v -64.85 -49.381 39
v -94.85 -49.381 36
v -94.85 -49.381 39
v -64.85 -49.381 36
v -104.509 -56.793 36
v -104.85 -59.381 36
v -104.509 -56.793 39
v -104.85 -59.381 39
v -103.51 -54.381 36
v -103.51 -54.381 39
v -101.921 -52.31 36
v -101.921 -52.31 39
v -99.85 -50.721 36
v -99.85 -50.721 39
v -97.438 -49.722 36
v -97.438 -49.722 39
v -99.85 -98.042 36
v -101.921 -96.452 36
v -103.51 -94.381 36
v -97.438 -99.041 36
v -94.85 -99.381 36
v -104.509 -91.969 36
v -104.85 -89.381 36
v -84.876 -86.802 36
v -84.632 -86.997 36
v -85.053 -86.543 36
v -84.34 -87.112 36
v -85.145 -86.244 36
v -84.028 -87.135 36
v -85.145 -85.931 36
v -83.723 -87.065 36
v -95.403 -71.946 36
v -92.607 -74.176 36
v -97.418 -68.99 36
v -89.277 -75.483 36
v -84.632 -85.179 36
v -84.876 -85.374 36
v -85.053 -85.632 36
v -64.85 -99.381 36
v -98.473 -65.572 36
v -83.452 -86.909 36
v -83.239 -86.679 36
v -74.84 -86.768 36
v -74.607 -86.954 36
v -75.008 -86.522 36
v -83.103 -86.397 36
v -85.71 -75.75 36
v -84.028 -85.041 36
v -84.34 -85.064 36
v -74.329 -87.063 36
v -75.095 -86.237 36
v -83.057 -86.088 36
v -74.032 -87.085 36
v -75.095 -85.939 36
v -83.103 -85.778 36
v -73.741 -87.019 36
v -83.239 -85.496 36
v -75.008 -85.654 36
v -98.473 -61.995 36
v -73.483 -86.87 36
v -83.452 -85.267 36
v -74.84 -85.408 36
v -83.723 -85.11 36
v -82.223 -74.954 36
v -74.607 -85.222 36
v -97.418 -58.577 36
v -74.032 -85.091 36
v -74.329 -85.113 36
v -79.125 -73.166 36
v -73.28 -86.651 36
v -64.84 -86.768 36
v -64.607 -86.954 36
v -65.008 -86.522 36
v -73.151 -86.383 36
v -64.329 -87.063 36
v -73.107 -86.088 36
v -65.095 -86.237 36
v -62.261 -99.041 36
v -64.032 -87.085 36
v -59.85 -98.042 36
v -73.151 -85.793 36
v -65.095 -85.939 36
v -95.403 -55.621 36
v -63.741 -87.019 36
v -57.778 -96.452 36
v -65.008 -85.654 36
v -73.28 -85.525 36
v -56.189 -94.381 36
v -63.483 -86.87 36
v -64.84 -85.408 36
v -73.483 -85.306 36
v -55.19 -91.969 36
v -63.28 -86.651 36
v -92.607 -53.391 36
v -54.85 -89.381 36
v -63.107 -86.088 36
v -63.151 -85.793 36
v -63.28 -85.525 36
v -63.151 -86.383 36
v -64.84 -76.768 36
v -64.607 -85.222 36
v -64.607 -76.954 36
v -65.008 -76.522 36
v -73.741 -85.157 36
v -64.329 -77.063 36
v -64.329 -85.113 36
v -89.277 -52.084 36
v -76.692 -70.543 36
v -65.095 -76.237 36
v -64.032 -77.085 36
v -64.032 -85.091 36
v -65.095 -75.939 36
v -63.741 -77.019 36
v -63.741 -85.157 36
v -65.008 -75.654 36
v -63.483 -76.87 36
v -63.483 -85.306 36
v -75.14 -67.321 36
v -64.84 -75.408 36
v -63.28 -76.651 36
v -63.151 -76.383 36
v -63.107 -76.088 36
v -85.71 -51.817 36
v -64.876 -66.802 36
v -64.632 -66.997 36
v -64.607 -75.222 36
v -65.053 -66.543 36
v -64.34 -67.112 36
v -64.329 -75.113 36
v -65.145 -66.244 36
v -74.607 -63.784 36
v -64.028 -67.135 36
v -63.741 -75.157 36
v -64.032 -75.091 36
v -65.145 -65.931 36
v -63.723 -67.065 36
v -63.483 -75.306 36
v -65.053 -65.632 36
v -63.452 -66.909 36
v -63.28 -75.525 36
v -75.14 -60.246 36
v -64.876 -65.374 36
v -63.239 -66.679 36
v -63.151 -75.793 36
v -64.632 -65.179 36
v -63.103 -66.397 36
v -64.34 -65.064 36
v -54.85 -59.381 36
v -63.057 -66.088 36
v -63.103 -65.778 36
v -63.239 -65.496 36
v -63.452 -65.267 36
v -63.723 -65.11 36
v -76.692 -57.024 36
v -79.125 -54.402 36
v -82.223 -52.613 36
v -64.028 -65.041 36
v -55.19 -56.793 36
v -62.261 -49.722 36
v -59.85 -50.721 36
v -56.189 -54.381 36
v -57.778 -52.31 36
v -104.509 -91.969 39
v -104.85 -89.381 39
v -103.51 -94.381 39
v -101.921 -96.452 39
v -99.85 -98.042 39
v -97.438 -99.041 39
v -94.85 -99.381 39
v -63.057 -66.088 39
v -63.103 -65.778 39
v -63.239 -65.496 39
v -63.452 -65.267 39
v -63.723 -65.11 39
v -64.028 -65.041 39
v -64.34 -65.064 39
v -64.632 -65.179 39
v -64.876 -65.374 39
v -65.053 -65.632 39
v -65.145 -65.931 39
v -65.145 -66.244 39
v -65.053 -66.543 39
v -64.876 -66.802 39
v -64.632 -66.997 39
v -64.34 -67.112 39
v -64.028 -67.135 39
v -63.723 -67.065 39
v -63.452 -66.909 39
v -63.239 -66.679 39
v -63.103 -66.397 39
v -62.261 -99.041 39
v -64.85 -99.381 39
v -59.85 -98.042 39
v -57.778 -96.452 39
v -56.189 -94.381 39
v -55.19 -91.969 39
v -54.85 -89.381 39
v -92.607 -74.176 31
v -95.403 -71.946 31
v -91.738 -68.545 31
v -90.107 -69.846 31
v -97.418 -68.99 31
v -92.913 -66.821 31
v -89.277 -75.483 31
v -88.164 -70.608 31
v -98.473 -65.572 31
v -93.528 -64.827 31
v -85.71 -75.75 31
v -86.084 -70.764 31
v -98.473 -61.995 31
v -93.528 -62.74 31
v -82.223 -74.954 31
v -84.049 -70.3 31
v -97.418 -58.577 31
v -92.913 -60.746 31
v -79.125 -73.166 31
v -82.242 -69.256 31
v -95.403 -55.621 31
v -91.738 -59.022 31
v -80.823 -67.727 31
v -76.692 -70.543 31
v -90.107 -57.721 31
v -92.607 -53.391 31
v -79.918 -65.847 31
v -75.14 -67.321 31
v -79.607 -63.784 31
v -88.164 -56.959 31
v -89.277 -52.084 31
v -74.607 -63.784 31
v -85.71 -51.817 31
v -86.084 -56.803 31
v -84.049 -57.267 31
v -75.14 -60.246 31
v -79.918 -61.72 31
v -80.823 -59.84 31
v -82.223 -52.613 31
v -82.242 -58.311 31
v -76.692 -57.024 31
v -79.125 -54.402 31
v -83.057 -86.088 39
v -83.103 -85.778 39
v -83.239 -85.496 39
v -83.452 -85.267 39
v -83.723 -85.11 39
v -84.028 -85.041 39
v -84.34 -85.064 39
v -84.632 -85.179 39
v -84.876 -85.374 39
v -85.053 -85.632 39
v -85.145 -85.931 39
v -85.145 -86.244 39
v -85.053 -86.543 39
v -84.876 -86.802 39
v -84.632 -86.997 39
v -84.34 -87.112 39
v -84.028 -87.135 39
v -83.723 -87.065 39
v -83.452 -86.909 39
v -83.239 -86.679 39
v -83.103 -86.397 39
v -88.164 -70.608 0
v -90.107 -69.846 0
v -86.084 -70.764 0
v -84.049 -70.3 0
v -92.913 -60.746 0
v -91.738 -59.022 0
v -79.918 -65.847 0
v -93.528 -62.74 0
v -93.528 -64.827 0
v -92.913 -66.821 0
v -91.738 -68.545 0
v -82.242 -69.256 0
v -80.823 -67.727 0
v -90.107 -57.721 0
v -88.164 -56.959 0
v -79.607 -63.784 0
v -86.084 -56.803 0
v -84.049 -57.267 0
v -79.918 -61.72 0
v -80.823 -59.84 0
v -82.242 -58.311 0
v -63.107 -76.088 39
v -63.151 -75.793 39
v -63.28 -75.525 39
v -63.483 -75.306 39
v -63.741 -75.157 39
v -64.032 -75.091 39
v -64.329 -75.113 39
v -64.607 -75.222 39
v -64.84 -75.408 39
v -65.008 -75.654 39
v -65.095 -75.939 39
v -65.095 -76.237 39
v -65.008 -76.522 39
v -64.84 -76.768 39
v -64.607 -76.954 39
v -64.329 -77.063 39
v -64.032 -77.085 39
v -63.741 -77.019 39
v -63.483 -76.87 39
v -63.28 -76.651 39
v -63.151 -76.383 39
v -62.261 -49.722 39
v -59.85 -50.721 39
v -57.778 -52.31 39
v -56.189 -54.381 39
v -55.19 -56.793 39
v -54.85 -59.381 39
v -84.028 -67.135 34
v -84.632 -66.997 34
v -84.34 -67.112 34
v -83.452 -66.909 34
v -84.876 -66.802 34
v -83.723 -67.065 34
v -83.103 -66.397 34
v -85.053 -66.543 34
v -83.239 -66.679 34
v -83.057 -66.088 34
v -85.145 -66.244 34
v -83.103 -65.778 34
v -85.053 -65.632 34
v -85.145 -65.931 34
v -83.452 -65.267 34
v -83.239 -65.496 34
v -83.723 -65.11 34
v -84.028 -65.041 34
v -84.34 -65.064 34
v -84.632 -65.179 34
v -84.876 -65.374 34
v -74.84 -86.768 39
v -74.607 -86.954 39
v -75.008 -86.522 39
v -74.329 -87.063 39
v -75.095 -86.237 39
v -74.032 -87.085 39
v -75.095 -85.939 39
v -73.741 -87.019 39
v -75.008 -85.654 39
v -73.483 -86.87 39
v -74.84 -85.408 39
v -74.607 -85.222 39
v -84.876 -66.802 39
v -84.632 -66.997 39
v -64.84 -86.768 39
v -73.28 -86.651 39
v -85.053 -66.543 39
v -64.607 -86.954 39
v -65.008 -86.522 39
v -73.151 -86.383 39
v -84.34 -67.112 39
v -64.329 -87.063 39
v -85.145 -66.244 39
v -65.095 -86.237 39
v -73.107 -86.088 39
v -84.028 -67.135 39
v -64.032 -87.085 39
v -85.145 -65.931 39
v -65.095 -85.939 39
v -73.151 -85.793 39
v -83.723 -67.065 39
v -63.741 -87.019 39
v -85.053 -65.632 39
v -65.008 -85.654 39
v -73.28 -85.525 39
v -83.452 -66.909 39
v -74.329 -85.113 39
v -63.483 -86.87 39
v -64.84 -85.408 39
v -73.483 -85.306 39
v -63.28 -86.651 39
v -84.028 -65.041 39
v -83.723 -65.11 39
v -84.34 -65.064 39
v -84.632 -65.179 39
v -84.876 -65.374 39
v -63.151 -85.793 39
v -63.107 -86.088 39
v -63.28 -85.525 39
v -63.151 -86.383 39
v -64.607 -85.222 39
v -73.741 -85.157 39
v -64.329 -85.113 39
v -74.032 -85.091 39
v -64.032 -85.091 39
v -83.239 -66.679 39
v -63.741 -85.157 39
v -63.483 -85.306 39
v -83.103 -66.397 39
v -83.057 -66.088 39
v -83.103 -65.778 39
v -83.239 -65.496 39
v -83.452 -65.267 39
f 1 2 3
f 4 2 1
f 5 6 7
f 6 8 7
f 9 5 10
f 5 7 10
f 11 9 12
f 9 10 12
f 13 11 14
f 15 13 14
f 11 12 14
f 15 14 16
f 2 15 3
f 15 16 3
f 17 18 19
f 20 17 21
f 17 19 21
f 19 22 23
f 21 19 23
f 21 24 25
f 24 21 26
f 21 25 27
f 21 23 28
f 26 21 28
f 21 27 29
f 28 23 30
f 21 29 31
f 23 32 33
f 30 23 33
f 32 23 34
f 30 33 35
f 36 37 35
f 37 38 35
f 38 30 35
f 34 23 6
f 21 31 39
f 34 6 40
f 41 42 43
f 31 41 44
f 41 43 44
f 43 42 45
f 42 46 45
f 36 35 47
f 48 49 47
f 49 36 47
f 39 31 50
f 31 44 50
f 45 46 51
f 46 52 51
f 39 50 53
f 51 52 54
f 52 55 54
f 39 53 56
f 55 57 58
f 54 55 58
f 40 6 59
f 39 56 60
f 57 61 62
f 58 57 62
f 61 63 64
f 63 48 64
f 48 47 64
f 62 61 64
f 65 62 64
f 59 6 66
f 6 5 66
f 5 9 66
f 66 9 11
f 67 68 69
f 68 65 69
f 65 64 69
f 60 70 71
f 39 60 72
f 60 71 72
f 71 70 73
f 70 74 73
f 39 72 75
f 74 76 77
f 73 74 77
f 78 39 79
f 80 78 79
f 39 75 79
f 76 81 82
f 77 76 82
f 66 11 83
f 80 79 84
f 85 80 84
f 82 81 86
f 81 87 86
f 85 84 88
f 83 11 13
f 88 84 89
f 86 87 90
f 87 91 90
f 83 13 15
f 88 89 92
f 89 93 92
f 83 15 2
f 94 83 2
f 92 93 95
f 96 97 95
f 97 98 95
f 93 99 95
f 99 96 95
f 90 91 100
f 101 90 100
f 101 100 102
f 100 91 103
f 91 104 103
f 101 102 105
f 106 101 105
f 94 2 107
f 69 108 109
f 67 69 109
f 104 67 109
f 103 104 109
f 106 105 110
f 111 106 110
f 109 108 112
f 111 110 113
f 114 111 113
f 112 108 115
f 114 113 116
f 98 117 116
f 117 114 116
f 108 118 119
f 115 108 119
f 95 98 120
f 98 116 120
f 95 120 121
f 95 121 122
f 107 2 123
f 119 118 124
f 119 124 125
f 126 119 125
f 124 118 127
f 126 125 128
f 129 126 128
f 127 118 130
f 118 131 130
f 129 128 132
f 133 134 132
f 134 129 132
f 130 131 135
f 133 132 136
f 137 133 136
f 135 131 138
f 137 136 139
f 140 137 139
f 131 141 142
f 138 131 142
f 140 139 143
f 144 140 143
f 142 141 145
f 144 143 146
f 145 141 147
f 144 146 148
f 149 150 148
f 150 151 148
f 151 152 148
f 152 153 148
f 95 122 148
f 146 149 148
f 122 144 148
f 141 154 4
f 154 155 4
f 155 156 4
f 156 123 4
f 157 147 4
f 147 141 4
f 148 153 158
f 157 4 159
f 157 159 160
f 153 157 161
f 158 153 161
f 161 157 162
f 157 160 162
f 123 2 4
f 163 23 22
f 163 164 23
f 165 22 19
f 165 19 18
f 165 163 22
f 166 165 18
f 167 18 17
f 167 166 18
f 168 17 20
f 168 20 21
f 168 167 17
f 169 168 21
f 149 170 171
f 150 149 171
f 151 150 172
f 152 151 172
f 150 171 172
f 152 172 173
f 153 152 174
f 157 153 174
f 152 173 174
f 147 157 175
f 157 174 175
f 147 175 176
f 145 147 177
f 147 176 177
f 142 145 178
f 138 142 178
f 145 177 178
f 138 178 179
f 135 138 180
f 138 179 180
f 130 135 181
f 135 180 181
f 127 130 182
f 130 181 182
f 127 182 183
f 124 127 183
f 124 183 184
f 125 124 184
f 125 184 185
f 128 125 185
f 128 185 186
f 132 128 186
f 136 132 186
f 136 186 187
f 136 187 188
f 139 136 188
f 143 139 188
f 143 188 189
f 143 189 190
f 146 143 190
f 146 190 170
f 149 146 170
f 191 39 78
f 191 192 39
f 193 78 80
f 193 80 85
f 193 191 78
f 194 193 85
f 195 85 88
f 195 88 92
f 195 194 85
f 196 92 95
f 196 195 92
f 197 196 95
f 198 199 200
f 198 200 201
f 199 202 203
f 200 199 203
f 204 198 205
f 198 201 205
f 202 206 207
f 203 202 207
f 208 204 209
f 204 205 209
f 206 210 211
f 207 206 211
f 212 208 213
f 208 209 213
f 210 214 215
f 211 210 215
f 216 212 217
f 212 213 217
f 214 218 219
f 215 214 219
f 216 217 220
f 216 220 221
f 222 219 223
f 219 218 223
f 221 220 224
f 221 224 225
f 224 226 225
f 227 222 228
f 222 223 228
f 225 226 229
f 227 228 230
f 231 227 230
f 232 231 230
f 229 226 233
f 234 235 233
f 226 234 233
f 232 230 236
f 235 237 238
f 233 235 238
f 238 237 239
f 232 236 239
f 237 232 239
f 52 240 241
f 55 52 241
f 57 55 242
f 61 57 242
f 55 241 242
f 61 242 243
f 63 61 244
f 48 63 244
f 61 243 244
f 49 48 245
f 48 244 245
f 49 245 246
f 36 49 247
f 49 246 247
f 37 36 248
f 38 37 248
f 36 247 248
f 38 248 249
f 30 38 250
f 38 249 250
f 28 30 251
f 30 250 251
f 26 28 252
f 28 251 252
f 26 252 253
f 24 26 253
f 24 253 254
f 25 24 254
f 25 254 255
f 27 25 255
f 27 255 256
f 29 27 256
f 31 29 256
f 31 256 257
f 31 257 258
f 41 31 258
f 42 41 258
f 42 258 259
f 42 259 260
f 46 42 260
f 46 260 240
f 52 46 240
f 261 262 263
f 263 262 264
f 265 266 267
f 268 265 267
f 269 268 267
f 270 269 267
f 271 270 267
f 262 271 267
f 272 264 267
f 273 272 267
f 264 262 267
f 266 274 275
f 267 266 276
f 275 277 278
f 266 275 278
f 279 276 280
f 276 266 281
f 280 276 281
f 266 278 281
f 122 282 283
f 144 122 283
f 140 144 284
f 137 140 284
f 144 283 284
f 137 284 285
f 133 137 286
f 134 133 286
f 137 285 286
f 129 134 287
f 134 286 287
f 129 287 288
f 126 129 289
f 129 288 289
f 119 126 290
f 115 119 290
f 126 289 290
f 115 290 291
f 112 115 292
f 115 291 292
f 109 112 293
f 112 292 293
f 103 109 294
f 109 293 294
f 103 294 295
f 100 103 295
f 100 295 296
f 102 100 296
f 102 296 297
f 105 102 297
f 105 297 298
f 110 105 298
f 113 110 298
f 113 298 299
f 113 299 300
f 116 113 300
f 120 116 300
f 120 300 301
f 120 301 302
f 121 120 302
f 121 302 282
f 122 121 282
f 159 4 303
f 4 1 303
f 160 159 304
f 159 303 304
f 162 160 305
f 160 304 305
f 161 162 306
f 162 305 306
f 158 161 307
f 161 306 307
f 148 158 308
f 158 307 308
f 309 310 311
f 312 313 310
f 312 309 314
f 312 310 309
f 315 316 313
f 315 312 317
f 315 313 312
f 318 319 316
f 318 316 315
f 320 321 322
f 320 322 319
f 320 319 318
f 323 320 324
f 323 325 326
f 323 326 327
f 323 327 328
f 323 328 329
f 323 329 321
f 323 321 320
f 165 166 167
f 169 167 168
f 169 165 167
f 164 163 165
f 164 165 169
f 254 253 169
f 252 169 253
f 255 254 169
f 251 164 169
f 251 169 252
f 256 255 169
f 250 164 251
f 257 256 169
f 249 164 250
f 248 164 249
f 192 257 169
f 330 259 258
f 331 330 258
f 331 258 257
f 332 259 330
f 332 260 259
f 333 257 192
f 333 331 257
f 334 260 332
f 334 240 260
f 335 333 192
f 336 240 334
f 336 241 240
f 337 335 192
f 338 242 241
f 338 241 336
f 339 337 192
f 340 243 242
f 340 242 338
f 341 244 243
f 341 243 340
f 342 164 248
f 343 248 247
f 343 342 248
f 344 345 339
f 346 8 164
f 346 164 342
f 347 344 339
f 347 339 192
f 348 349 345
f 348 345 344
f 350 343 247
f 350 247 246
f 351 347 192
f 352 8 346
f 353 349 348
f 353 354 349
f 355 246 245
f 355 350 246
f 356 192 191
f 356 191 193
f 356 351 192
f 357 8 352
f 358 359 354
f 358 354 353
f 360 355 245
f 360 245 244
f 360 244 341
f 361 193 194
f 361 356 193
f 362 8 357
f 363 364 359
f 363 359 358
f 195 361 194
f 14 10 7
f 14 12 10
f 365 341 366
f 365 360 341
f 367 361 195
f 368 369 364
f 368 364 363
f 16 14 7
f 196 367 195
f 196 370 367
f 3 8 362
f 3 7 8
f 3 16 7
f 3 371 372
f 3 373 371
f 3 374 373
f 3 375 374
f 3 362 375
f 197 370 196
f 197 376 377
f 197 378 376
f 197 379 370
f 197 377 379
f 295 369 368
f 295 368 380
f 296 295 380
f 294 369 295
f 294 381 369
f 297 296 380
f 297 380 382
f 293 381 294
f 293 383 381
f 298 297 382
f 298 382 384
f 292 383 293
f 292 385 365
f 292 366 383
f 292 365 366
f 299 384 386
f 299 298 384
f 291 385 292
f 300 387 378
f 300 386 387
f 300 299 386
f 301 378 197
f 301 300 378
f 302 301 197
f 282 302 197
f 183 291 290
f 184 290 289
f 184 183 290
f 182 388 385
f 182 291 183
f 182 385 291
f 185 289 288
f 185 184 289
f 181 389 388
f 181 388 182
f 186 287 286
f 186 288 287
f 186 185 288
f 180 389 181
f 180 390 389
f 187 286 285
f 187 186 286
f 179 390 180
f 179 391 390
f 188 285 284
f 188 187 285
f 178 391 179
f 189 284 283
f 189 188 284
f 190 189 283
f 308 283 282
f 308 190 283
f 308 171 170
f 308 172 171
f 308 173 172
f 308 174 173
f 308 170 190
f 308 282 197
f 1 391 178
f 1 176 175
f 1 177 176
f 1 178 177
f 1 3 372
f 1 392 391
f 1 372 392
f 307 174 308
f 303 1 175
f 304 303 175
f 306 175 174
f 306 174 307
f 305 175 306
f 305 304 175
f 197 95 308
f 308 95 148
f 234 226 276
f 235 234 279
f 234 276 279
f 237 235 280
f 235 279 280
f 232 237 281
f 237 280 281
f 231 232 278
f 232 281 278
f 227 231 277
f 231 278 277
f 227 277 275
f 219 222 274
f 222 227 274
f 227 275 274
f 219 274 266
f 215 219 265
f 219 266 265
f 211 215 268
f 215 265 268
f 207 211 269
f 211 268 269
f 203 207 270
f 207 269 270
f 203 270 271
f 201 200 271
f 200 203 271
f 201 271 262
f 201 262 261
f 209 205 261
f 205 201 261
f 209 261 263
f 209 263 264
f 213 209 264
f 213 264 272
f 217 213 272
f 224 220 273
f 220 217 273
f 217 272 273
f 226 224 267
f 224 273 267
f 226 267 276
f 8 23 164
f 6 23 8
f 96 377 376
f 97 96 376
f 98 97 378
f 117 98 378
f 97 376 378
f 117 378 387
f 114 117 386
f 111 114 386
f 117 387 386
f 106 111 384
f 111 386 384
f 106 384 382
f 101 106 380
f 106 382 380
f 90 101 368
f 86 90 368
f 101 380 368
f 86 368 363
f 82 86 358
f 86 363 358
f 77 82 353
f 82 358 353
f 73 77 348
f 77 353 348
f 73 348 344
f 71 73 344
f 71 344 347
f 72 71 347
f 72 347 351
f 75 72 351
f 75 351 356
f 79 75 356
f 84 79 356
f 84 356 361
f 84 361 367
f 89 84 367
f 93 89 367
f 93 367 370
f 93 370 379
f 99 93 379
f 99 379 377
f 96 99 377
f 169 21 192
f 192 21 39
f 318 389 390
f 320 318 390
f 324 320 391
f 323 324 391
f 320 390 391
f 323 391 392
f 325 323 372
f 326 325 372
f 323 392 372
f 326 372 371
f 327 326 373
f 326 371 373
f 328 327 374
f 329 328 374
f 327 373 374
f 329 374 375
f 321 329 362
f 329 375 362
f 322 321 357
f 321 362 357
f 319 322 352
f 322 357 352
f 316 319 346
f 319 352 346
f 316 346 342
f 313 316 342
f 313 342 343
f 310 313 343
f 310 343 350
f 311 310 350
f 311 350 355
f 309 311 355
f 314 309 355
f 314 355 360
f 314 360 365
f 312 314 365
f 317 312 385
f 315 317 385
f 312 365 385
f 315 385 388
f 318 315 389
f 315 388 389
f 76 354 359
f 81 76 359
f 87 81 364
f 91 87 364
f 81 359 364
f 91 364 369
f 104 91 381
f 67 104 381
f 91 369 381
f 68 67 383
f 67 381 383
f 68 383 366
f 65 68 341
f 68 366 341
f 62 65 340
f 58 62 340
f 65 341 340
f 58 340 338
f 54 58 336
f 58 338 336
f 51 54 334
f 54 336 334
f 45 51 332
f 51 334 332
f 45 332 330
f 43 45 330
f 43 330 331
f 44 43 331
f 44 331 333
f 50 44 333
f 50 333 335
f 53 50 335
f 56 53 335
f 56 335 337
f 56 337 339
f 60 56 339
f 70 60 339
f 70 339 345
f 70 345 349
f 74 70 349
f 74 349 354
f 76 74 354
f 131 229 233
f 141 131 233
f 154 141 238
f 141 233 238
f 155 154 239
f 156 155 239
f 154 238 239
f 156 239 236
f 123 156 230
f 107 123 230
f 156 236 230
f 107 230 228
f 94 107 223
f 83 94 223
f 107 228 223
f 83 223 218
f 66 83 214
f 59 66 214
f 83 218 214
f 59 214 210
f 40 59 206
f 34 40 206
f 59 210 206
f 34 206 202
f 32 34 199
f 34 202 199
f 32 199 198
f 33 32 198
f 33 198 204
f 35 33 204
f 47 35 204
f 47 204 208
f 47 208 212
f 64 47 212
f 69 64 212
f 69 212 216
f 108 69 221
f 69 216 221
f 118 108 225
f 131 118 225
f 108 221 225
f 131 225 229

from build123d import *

# Parameters (mm, degrees)
SKETCH_1_R           = 7
EXTRUDE_1_DEPTH      = 34
EXTRUDE_2_DEPTH      = 2
EXTRUDE_2_DEPTH_BACK = 3
SKETCH_2_R           = 12
SKETCH_3_W           = 50
SKETCH_3_H           = 50
EXTRUDE_4_DEPTH      = 3
SKETCH_5_R           = 1.05
SKETCH_5_R_2         = 1
CUT_EXTRUDE_1_DEPTH  = 5
FILLET_1_R           = 10


with BuildPart() as part:
    # 草图1 → 凸台-拉伸1 (new body)
    with BuildSketch(Plane.XY):
        with Locations((-86.606649797, -63.783530386)):
            Circle(SKETCH_1_R)
    extrude(amount=EXTRUDE_1_DEPTH)

    # 草图2 → 凸台-拉伸2 (add, two sides: drawn at the far end of the back side and taken through both)
    with BuildSketch(Plane.XY.offset(34).offset(-EXTRUDE_2_DEPTH_BACK)):
        with Locations((-86.606649797, -63.783530386)):
            Circle(SKETCH_2_R)
    extrude(amount=EXTRUDE_2_DEPTH + EXTRUDE_2_DEPTH_BACK)

    # 草图3 → 凸台-拉伸4 (add)
    with BuildSketch(Plane.XY.offset(36)):
        with Locations((-79.849508923, -74.381256309)):
            Rectangle(SKETCH_3_W, SKETCH_3_H)
    extrude(amount=EXTRUDE_4_DEPTH)

    # 草图5 → 切除-拉伸1 (cut)
    with BuildSketch(Plane.XY.offset(39)):
        with Locations((-84.106649797, -86.087855448)):
            Circle(SKETCH_5_R)
        with Locations((-74.106649797, -86.087855448)):
            Circle(SKETCH_5_R_2)
        with Locations((-64.106649797, -86.087855448)):
            Circle(SKETCH_5_R_2)
        with Locations((-64.106649797, -76.087855448)):
            Circle(SKETCH_5_R_2)
        with Locations((-64.106649797, -66.087855448)):
            Circle(SKETCH_5_R)
        with Locations((-84.106649797, -66.087855448)):
            Circle(SKETCH_5_R)
    extrude(amount=-CUT_EXTRUDE_1_DEPTH, mode=Mode.SUBTRACT)

    # 圆角1
    fillet_1_edges = [part.edges().sort_by_distance(p)[0] for p in [
        (-104.849508923, -49.381256309, 37.5),
        (-104.849508923, -99.381256309, 37.5),
        (-54.849508923, -99.381256309, 37.5),
        (-54.849508923, -49.381256309, 37.5),
    ]]
    fillet(fillet_1_edges, radius=FILLET_1_R)


solid = part.part
